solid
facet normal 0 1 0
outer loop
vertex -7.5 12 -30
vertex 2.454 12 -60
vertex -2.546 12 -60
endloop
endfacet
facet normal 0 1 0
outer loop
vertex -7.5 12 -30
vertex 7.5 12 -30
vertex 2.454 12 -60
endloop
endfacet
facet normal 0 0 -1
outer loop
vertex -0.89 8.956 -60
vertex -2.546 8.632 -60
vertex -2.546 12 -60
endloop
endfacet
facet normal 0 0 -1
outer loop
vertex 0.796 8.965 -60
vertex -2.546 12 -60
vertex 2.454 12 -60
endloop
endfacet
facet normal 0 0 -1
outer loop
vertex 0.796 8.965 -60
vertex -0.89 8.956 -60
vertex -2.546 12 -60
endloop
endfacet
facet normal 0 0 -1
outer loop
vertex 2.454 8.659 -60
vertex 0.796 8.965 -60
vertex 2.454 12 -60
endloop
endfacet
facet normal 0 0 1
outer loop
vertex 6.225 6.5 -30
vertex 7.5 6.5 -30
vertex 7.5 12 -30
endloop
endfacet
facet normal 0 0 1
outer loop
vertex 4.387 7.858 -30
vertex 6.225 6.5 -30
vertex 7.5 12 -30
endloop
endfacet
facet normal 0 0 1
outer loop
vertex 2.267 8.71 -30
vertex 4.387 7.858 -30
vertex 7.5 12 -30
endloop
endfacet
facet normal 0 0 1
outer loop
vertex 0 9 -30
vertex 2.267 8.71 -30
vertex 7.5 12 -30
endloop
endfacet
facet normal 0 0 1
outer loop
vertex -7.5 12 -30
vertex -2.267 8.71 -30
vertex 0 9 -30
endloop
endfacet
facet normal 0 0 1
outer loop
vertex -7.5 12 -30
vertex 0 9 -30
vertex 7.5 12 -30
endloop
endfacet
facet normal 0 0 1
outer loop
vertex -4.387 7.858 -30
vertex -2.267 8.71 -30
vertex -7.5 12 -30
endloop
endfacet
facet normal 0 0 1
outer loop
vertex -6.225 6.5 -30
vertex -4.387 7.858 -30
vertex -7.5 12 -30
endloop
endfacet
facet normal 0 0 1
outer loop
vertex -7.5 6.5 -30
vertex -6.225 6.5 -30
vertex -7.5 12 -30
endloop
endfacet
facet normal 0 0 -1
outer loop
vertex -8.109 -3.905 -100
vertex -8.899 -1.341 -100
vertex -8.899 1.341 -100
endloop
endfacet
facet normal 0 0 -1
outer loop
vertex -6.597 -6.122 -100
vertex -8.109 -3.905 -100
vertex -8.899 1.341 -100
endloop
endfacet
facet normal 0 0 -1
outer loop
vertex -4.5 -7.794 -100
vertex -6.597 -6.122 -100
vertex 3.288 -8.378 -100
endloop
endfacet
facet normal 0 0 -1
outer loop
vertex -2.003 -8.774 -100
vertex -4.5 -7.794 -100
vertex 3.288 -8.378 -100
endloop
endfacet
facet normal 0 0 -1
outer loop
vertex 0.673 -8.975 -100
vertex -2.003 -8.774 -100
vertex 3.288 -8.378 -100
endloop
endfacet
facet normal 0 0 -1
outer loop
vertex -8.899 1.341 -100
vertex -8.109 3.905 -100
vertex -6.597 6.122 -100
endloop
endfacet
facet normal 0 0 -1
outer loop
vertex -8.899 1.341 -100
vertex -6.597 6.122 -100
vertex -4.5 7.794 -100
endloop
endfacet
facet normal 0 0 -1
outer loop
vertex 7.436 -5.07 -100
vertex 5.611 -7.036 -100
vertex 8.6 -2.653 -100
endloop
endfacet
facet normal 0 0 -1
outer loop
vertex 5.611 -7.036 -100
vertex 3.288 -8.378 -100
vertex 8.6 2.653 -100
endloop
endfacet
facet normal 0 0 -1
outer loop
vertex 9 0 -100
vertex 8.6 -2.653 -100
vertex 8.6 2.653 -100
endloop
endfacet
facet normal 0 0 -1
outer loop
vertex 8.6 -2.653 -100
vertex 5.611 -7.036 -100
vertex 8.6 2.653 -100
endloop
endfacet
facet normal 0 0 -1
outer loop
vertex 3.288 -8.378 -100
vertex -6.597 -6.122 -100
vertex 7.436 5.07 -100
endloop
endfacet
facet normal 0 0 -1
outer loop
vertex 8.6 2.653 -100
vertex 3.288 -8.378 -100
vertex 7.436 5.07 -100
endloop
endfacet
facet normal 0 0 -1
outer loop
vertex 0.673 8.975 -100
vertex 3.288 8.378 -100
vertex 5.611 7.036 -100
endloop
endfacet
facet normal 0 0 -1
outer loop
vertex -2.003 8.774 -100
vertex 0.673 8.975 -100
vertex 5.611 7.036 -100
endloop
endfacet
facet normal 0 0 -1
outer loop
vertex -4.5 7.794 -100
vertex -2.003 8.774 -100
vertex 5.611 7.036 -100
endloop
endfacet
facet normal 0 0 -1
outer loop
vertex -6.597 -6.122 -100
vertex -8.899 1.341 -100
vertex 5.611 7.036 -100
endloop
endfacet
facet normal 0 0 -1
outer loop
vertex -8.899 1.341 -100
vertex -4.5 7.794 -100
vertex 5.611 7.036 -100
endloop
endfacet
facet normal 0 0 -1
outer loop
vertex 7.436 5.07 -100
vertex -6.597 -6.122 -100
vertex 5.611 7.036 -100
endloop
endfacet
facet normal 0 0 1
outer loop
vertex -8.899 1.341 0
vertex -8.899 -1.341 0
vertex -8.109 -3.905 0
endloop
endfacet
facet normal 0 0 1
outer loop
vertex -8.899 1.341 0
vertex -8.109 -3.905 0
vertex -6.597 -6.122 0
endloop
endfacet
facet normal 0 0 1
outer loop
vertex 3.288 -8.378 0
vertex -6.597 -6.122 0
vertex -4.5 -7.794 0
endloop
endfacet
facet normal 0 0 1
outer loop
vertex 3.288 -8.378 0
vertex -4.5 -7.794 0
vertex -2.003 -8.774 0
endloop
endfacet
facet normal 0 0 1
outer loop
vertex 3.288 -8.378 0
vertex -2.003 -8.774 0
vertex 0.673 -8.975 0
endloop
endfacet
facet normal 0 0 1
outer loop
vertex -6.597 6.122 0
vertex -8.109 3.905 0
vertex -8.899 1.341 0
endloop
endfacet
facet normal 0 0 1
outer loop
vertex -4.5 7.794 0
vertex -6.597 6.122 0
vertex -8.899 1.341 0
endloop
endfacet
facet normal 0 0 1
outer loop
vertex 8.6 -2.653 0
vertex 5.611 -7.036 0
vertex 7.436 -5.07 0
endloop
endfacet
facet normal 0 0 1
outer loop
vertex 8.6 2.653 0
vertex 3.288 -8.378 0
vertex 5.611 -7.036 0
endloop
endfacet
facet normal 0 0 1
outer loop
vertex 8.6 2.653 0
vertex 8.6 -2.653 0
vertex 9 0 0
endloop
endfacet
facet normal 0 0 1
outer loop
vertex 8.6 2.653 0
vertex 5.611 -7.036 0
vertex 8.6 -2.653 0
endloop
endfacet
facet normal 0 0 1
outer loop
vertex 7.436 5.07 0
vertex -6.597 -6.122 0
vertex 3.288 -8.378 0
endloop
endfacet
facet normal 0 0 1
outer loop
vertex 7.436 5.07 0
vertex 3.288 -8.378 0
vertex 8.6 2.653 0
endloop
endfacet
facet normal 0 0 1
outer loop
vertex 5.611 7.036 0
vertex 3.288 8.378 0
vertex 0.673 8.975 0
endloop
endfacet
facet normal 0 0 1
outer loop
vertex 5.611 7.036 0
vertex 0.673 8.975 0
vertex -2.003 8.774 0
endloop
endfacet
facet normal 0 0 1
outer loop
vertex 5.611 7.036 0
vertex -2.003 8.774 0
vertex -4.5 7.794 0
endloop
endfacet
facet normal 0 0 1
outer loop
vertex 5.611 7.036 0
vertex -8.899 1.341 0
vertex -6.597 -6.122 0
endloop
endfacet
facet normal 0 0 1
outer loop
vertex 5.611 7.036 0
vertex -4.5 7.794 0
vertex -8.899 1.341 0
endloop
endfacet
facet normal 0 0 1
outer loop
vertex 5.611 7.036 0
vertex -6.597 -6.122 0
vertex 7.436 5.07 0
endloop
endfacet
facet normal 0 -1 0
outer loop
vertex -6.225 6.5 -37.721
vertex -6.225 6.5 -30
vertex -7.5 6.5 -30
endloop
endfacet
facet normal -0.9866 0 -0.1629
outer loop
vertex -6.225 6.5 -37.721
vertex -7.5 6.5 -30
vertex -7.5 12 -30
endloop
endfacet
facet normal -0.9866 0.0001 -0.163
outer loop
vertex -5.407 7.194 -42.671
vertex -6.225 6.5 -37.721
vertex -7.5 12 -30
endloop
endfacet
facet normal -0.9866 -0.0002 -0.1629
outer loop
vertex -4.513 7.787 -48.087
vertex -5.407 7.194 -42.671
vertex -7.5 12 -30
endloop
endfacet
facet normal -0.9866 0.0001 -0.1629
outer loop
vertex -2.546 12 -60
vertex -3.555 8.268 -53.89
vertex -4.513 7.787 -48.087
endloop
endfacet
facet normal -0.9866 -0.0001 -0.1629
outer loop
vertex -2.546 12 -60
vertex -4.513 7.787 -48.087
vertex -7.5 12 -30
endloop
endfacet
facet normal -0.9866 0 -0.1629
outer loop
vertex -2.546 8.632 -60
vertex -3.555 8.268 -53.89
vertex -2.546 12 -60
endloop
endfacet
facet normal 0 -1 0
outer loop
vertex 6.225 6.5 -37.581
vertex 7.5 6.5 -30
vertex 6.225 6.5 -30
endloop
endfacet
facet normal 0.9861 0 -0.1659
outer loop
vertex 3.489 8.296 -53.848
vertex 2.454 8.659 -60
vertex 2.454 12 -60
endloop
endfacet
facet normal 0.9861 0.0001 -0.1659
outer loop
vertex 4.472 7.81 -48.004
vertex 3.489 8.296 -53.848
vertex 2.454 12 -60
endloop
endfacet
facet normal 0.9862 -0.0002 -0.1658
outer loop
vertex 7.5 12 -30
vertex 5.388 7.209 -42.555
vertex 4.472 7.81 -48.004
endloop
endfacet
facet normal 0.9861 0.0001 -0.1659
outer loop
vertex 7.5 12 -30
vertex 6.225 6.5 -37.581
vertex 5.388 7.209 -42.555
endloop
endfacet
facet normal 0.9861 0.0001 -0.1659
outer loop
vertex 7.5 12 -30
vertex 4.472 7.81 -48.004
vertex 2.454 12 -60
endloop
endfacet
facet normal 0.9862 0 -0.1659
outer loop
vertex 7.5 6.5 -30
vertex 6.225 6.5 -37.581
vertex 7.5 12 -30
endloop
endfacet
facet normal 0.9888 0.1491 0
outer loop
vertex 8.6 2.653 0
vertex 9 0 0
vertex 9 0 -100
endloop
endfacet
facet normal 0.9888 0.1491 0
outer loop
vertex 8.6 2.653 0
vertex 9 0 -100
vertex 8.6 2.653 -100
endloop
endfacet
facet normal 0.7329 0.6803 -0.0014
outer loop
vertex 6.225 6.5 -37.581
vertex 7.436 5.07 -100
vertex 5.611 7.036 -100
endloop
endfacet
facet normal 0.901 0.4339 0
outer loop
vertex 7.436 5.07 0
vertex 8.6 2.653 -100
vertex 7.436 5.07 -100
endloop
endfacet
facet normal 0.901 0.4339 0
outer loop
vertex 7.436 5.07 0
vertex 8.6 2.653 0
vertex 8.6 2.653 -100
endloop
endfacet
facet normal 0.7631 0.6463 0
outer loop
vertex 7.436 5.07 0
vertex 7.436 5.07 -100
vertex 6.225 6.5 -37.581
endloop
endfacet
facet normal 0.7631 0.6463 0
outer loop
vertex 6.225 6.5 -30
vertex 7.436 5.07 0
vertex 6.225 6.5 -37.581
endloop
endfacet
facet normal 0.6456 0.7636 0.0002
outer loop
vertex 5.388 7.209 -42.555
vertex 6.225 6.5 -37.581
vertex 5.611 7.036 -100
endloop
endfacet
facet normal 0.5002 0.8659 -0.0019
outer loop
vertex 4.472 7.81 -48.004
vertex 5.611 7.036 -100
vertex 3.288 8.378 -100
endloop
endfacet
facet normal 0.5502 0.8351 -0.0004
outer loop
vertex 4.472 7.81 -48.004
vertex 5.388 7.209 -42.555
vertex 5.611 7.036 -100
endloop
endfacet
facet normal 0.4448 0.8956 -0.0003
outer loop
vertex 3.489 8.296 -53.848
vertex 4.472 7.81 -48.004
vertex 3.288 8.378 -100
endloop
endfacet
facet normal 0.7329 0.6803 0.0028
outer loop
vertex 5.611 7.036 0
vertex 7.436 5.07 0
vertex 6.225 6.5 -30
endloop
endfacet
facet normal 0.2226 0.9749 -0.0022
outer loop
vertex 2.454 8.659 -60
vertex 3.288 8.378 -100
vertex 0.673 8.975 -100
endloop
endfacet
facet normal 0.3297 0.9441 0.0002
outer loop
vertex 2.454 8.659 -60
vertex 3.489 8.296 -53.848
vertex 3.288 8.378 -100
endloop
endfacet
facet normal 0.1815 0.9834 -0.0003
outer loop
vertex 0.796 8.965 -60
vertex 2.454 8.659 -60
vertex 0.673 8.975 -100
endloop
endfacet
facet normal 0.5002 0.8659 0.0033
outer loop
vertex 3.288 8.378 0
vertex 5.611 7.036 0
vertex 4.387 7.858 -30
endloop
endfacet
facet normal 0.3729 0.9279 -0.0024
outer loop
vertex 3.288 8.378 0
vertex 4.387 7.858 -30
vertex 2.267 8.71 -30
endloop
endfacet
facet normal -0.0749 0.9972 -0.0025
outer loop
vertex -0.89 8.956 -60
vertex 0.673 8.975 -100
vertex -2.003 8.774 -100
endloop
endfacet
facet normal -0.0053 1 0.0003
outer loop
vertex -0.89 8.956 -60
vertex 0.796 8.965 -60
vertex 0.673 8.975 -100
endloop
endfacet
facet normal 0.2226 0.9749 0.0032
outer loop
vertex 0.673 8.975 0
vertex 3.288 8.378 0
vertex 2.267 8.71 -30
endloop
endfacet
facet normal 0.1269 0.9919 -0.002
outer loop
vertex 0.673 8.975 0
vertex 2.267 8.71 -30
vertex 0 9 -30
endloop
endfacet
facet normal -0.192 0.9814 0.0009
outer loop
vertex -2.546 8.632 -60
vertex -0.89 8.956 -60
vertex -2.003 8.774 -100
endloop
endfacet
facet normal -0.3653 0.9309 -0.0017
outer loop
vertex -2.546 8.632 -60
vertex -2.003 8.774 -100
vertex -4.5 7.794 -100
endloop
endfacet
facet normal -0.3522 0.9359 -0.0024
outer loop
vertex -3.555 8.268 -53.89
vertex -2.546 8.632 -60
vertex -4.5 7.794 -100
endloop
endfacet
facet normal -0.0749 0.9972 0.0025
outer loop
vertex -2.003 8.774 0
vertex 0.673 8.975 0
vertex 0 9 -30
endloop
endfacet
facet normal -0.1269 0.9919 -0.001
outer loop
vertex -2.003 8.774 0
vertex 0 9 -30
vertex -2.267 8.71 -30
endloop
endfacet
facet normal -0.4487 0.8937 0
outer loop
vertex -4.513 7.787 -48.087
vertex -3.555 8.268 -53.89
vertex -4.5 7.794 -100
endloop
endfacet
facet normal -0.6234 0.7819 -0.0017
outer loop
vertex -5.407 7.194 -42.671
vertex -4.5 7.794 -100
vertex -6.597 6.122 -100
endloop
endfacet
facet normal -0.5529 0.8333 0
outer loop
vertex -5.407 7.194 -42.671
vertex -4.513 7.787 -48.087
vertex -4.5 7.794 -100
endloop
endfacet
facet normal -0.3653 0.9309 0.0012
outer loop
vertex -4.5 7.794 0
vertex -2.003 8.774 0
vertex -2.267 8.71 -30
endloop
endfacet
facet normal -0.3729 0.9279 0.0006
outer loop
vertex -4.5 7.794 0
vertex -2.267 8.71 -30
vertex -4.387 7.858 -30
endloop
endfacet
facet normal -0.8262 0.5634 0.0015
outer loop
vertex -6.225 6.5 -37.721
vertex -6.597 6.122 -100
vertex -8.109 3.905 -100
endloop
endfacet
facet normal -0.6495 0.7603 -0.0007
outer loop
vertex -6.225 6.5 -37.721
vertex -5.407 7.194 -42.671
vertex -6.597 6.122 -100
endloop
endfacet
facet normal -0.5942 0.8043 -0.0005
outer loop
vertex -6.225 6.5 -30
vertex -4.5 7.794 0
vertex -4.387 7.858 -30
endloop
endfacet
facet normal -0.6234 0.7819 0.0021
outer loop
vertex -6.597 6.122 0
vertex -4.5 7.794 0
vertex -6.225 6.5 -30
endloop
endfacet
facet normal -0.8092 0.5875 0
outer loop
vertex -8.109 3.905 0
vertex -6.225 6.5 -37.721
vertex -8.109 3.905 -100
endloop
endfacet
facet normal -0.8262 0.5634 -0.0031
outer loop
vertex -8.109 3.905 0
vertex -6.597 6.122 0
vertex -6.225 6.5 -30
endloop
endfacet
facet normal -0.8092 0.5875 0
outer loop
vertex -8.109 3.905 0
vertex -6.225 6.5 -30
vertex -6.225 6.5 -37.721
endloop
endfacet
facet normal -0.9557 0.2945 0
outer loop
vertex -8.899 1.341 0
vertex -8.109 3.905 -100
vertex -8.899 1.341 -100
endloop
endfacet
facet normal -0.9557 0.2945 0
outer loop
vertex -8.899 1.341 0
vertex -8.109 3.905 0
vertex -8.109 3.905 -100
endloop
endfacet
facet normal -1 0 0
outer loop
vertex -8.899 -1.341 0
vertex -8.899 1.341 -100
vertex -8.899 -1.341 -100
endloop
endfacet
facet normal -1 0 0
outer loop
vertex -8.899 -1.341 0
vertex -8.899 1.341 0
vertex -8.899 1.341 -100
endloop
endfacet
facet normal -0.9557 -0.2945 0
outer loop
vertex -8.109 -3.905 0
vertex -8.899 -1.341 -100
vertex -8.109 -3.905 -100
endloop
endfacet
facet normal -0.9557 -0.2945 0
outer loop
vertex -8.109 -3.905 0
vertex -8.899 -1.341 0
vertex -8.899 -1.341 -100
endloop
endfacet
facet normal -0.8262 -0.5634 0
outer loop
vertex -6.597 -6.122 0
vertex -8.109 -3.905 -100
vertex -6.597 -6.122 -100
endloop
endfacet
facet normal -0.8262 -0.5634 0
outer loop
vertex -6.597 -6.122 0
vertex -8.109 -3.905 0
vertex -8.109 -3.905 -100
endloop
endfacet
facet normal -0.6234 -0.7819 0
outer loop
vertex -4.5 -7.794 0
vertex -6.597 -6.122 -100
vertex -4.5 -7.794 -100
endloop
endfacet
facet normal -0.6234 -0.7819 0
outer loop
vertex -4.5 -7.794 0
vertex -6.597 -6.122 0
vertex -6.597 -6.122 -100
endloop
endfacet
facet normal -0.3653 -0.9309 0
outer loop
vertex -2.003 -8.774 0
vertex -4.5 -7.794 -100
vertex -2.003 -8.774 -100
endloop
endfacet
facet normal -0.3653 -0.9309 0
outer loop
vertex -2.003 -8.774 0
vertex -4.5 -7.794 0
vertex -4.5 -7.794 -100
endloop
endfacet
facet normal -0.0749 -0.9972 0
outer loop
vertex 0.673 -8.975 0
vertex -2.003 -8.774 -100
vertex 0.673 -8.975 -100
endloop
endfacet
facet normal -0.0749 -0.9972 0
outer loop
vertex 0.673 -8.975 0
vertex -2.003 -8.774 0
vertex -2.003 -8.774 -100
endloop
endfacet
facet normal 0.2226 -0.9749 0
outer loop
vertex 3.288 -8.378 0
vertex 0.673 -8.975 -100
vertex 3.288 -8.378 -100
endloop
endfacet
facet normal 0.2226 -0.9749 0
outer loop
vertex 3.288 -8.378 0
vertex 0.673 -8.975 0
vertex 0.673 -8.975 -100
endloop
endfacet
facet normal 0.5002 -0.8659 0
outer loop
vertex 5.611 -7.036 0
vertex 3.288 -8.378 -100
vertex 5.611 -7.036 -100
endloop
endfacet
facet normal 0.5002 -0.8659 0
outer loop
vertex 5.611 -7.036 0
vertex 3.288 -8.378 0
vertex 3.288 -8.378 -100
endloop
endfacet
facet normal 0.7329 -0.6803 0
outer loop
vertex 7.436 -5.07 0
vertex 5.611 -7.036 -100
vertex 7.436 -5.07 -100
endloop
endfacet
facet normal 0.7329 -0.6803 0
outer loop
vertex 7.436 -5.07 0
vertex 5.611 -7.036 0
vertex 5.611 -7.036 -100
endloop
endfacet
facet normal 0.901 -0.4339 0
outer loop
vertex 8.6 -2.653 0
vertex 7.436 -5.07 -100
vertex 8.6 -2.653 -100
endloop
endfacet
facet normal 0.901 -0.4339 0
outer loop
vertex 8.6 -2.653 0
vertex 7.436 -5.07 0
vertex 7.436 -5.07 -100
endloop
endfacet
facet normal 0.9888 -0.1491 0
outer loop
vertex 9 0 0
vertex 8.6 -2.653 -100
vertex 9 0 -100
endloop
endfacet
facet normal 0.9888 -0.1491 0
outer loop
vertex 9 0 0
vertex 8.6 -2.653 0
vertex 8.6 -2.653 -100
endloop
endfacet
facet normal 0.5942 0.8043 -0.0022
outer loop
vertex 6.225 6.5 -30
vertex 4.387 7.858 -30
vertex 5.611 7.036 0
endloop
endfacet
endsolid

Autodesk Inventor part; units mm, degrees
ref_plane "YZ Plane" through (0, 0, 0) normal (1, 0, 0) x (0, 1, 0)
ref_plane "XY Plane" through (0, 0, 0) normal (0, 0, 1) x (1, 0, 0)
sketch "Sketch4" plane through (0, 0, 0) normal (0, 0, 1) x (1, 0, 0)
  circle A0 centre (0, 0) radius 9
  dimension "d5" = 18
sketch "Sketch5" plane through (0, 0, 0) normal (1, 0, 0) x (0, 1, 0)
  point P0 (0, 0)
ref_plane "Work Plane1" through (0, 9, 0) normal (0, 1, 0) x (-1, 0, 0)
sketch "Sketch6" plane through (0, 9, 0) normal (0, 1, 0) x (-1, 0, 0)
  line L0 (0, 0) -> (0, -100)
  line L1 (0, -30) -> (7.5, -30)
  line L2 (7.5, -30) -> (2.5456, -60)
  line L3 (2.5456, -60) -> (-2.4544, -60)
  line L4 (-2.4544, -60) -> (-7.5, -30)
  line L5 (-7.5, -30) -> (0, -30)
  dimension "d7" = 100
  dimension "d8" = 5
  dimension "d9" = 7.5
  dimension "d10" = 7.5
  dimension "d11" = 30
  dimension "d12" = 40
extrude "Extrusion3" add sketch "Sketch4" against normal blind 100
extrude "Extrusion4" add sketch "Sketch6" along normal blind 3 and the other way blind 2.5
